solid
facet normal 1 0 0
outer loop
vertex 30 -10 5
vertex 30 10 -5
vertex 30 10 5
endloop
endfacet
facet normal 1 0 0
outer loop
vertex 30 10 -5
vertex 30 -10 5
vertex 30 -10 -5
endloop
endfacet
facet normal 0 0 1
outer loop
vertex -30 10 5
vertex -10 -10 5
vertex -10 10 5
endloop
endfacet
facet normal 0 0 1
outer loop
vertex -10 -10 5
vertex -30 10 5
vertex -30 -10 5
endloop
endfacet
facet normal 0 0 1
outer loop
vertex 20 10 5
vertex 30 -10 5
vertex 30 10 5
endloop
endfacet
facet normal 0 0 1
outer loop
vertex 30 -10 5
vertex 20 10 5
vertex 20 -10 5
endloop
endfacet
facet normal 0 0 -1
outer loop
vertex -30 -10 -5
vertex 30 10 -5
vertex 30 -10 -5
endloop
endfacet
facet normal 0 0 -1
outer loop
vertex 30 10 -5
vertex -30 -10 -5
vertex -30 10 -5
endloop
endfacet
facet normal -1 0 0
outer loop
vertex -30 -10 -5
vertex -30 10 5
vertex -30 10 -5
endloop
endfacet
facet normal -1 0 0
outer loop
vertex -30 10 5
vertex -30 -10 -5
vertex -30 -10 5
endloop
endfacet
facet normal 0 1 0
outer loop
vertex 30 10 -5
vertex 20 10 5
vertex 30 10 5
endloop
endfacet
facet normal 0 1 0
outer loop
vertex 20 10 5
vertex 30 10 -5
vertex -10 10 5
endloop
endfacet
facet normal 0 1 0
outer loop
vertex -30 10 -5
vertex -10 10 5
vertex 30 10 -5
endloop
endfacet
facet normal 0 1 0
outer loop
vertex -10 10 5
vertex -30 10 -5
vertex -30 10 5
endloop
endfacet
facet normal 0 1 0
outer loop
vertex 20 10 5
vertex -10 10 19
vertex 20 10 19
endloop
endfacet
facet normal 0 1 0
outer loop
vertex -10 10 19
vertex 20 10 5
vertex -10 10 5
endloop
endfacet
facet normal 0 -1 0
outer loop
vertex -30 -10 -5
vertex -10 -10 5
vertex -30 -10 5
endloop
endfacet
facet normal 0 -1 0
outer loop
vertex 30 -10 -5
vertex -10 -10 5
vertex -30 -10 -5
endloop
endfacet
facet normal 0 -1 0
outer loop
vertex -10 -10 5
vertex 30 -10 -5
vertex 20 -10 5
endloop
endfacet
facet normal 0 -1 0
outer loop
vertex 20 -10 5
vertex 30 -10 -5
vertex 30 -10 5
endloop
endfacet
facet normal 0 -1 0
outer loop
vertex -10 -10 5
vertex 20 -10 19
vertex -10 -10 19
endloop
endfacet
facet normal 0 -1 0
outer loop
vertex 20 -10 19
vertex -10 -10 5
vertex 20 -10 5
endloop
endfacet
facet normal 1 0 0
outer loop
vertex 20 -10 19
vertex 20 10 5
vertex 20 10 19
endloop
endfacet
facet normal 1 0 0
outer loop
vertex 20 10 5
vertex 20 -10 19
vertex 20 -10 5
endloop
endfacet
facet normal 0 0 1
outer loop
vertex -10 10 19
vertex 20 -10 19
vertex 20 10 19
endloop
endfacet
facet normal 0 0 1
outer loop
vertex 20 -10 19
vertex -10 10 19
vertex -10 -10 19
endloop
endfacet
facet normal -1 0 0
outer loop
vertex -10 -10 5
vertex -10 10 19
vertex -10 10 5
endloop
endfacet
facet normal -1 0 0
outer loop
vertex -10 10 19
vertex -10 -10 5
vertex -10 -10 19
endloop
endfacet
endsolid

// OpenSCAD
module body(base_height=10, top_height=14, base_length=60, top_length=30, width=20, top_offset=5, top) {
    // Car body base 
    cube([base_length,width,base_height],center=true); 
    // Car body top
    if (top) {
        translate([top_offset,0,base_height/2+top_height/2])
            cube([top_length,width,top_height],center=true);
    }
}
$fa = 1;
$fs = 0.4;
body(top=true);
